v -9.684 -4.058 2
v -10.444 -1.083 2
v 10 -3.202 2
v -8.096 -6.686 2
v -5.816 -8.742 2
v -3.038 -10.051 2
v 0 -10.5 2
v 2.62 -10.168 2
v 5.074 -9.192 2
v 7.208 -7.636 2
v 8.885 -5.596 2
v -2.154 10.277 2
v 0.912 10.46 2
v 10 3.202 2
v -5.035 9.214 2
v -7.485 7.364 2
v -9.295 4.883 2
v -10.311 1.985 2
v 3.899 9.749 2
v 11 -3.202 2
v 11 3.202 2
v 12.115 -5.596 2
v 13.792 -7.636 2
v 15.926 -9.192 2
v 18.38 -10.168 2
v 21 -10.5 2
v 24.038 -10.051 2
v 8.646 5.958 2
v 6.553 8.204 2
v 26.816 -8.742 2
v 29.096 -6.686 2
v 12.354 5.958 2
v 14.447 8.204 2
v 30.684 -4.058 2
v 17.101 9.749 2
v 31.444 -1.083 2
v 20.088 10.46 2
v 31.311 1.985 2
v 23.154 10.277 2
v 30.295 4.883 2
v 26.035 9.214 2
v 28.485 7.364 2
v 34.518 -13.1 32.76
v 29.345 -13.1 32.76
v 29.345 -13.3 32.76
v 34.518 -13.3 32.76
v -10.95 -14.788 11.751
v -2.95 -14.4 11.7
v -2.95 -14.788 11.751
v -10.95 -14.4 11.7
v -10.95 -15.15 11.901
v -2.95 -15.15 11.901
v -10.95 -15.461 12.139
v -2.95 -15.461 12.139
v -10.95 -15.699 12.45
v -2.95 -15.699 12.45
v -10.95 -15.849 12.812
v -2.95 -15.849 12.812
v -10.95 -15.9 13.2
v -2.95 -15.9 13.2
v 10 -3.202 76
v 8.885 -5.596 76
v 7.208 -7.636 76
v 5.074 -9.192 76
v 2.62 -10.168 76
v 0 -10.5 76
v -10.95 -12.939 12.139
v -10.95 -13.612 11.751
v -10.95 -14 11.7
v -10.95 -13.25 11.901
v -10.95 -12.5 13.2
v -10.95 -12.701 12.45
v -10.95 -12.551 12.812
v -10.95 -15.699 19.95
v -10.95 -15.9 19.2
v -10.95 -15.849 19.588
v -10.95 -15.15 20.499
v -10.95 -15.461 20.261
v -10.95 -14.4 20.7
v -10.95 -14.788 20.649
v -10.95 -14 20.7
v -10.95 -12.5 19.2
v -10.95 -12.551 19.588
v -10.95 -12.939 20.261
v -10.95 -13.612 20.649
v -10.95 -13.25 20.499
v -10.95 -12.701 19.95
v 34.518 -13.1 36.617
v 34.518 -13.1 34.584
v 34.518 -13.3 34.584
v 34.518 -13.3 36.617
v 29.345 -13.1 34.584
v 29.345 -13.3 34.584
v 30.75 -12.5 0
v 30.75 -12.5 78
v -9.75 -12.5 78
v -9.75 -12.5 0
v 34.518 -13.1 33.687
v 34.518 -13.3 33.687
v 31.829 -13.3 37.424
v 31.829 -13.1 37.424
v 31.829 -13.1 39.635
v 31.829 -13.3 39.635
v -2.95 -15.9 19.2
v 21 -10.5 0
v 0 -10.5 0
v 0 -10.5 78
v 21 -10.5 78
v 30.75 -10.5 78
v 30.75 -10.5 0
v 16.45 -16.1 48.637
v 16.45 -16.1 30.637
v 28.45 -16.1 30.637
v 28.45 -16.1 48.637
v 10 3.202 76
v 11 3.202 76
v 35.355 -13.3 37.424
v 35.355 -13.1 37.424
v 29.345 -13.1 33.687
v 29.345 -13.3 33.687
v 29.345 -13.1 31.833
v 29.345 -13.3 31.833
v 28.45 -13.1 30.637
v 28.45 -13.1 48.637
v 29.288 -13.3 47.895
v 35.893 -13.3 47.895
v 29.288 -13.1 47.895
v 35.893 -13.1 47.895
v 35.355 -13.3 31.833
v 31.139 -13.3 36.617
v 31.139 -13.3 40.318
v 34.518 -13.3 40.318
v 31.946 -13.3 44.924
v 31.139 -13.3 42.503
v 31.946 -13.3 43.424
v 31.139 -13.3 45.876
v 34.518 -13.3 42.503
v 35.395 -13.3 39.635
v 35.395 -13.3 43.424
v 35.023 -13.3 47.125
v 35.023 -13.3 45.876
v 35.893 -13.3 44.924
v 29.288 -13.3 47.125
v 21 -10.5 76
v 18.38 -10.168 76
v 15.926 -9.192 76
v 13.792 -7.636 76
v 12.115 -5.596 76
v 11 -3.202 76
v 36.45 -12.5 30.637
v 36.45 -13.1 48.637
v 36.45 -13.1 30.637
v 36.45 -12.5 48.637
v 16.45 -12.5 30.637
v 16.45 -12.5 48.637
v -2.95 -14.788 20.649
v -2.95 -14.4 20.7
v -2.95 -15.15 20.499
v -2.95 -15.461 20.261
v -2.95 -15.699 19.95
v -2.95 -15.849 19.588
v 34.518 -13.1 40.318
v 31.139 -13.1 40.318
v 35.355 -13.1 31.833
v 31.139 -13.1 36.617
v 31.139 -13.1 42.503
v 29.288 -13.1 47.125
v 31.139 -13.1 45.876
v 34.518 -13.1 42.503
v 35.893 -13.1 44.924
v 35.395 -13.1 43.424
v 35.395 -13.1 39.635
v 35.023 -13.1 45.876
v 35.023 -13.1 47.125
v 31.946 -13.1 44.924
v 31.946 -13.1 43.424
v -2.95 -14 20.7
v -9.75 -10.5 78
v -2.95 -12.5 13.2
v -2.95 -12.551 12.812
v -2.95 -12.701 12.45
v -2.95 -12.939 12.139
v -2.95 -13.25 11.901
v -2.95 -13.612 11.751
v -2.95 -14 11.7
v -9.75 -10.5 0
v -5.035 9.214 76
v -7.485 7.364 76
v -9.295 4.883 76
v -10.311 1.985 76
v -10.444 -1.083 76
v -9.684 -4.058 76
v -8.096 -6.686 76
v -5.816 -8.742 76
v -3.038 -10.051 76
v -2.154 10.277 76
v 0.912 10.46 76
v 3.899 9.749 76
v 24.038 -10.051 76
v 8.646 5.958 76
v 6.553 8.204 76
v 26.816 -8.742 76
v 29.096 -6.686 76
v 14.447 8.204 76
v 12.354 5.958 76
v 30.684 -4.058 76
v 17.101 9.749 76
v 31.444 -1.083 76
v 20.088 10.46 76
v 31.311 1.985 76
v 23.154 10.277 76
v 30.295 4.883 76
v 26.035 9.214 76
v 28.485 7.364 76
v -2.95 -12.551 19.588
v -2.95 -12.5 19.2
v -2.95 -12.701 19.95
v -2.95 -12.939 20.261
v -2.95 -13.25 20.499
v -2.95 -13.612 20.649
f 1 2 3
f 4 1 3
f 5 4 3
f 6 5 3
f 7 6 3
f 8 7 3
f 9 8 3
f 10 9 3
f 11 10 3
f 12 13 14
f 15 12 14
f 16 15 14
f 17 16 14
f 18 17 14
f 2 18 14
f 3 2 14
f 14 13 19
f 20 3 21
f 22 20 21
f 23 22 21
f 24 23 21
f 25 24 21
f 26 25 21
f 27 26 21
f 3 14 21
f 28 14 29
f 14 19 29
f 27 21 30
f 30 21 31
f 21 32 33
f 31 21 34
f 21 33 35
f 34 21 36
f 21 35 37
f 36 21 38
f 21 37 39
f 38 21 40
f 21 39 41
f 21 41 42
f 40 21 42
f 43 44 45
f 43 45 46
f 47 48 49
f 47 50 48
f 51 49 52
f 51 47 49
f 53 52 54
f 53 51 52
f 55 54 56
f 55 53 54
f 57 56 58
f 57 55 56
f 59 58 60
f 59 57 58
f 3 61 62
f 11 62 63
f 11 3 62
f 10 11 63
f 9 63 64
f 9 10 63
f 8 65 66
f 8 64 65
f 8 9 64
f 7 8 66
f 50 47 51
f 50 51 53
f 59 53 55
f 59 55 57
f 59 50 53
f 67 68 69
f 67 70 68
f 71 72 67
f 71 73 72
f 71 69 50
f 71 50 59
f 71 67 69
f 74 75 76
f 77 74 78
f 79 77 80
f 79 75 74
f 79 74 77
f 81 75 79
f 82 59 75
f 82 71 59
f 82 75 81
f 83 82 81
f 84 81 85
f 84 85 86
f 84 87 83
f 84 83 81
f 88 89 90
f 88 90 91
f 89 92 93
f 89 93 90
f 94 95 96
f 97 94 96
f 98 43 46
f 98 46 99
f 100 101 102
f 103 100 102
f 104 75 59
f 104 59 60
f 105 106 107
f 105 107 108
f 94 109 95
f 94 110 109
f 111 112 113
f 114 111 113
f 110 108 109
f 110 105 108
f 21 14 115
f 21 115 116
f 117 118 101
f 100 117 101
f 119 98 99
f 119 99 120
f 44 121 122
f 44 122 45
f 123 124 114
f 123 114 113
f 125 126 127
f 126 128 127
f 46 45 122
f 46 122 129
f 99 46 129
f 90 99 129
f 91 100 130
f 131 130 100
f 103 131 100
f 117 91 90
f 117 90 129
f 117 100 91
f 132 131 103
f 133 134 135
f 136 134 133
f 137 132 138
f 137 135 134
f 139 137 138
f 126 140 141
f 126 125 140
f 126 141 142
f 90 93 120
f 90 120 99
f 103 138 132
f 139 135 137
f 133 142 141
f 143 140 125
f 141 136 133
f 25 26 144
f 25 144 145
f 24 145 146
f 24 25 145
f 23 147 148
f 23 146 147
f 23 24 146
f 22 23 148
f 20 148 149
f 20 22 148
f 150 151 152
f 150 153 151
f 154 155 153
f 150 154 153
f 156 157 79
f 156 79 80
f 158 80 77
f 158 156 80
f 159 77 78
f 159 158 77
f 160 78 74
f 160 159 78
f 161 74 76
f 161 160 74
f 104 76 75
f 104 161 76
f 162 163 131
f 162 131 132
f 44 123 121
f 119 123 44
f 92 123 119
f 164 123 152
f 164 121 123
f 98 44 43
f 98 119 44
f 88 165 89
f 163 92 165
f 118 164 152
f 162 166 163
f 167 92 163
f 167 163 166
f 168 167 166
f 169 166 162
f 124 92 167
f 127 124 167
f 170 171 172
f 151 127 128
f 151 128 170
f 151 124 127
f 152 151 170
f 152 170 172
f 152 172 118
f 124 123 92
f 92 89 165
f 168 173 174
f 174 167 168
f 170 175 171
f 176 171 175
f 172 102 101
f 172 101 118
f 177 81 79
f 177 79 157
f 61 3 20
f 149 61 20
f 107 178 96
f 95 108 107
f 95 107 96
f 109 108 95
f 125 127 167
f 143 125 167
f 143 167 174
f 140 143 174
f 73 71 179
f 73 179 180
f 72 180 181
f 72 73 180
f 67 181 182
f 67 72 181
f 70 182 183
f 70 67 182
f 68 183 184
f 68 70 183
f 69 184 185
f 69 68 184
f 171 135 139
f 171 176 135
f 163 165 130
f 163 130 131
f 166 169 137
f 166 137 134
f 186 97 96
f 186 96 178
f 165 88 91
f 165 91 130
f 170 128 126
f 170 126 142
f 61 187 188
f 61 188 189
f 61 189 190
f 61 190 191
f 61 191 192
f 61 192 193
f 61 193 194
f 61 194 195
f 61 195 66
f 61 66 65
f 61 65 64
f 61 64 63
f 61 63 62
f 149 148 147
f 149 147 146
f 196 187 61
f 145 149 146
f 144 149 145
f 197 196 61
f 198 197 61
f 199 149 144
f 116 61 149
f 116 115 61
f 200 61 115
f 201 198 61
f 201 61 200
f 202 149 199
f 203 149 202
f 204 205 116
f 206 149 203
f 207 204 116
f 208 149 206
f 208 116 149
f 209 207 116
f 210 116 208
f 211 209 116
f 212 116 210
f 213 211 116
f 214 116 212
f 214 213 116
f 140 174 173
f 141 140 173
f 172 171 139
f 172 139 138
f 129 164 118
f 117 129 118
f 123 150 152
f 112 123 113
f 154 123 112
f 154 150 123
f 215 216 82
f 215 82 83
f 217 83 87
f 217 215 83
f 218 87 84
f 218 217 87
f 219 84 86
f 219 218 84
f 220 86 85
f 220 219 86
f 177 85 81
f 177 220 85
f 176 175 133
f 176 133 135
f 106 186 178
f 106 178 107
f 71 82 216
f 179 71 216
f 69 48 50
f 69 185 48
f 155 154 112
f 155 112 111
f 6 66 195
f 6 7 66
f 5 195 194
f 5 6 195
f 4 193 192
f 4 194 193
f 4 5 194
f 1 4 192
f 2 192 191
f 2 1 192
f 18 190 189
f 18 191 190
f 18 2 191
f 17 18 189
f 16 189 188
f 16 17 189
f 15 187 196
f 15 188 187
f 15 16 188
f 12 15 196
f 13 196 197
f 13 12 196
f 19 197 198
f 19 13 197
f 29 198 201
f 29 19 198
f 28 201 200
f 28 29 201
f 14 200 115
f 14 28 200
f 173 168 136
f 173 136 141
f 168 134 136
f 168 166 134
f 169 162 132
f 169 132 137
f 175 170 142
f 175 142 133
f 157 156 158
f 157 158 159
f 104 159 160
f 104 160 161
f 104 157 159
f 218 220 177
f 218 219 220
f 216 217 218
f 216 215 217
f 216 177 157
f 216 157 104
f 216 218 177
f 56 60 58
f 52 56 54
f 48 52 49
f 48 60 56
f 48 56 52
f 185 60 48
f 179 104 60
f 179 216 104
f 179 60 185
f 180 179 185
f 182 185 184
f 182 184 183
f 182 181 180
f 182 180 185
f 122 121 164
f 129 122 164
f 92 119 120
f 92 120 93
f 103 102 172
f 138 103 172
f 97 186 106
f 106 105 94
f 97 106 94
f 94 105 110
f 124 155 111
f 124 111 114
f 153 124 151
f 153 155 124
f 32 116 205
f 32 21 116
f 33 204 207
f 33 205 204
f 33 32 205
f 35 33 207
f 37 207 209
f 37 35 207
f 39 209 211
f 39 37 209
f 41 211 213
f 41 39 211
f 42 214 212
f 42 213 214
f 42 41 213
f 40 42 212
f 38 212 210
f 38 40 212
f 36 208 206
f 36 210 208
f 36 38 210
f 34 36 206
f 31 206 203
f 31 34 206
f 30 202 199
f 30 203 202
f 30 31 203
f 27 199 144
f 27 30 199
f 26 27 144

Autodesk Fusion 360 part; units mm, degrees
sketch "Sketch1" plane through (0, 0, 0) normal (0, 0, 1) x (1, 0, 0)
  line L0 (-9.75, -10.5) -> (30.75, -10.5)
  line L1 (30.75, -10.5) -> (30.75, -12.5)
  line L2 (30.75, -12.5) -> (-9.75, -12.5)
  line L3 (-9.75, -12.5) -> (-9.75, -10.5)
  line L4 (21, 0) -> (0, 0) construction
  line L5 (10.5, -10.5) -> (10.5, 0) construction
  line L6 (10, 3.2016) -> (11, 3.2016)
  line L7 (10, -3.2016) -> (11, -3.2016)
  arc A0 (10, 3.2016) -> (10, -3.2016) centre (0, 0) ccw
  arc A1 (10, -3.2016) -> (10.5, 0) centre (0, 0) ccw construction
  arc A2 (11, -3.2016) -> (11, 3.2016) centre (21, 0) ccw
  arc A3 (10.5, 0) -> (11, -3.2016) centre (21, 0) ccw construction
  arc A4 (10.5, 0) -> (10, 3.2016) centre (0, 0) ccw construction
  arc A5 (11, 3.2016) -> (10.5, 0) centre (21, 0) ccw construction
  dimension "d1" = 21
  dimension "d2" = 2
  dimension "d3" = 40.5
  dimension "d9" = 1
extrude "Extrude1" add sketch "Sketch1" along normal blind 78 contours L0 L1 L2 L3 makes body 1
extrude "Extrude2" add sketch "Sketch1" along normal blind 74 from surface at 2 separate body contours L6 L7 A0 A2 makes body 2
sketch "Sketch4" plane through (0, -12.5, 0) normal (0, -1, 0) x (1, 0, 0)
  line L0 (-9.75, 0) -> (30.75, 0)
  line L1 (30.75, 0) -> (30.75, 78) construction
  line L2 (30.75, 78) -> (-9.75, 78)
  line L3 (-9.75, 78) -> (-9.75, 0) construction
  line L4 (-10.95, 20.7) -> (-2.95, 20.7)
  line L5 (-2.95, 20.7) -> (-2.95, 11.7)
  line L6 (-2.95, 11.7) -> (-10.95, 11.7)
  line L7 (-10.95, 11.7) -> (-10.95, 20.7)
  line L8 (16.45, 48.6368) -> (36.45, 48.6368)
  line L9 (36.45, 48.6368) -> (36.45, 30.6368)
  line L10 (36.45, 30.6368) -> (16.45, 30.6368)
  line L11 (16.45, 30.6368) -> (16.45, 48.6368)
  line L12 (28.45, 48.6368) -> (28.45, 30.6368)
  dimension "d25" = 9
  dimension "d26" = 8
  dimension "d27" = 1.2
  dimension "d28" = 11.7
  dimension "d29" = 18
  dimension "d30" = 20
  dimension "d31" = 12
  dimension "d32" = 5.7
extrude "Extrude5" add sketch "Sketch4" along normal blind 3.4 separate body contours L4 L5 L6 L7 makes body 3
extrude "Extrude6" add sketch "Sketch4" along normal blind 0.6 separate body contours L8 L9 L10 L12 makes body 4
extrude "Extrude7" add sketch "Sketch4" along normal blind 3.6 contours L8 L10 L11 L12 bodies 4
fillet "Fillet1" radius 1.5 4 edges at (-6.95, -15.9, 11.7) (-6.95, -12.5, 11.7) (-6.95, -15.9, 20.7) (-6.95, -12.5, 20.7) on bodies 3
sketch "Sketch5" plane through (0, -13.1, 0) normal (0, -1, 0) x (1, 0, 0)
  line L0 (36.45, 48.6368) -> (28.45, 48.6368)
  line L1 (28.45, 48.6368) -> (28.45, 30.6368)
  line L2 (28.45, 30.6368) -> (36.45, 30.6368)
  line L3 (36.45, 30.6368) -> (36.45, 48.6368)
  line L4 (29.3453, 31.8332) -> (35.355, 31.8332)
  line L5 (35.355, 31.8332) -> (35.355, 37.4243)
  line L6 (35.355, 37.4243) -> (31.8287, 37.4243)
  line L7 (31.8287, 37.4243) -> (31.8287, 39.6348)
  line L8 (31.8287, 39.6348) -> (35.3949, 39.6348)
  line L9 (29.3453, 31.8332) -> (29.3453, 32.7601)
  line L10 (29.3453, 32.7601) -> (34.5178, 32.7601)
  line L11 (34.5178, 32.7601) -> (34.5178, 33.6869)
  line L12 (34.5178, 33.6869) -> (29.3453, 33.6869)
  line L13 (29.3453, 33.6869) -> (29.3453, 34.5839)
  line L14 (29.3453, 34.5839) -> (34.5178, 34.5839)
  line L15 (34.5178, 34.5839) -> (34.5178, 36.617)
  line L16 (34.5178, 36.617) -> (31.1393, 36.617)
  line L17 (31.1393, 36.617) -> (31.1393, 40.3179)
  line L18 (31.1393, 40.3179) -> (34.5178, 40.3179)
  line L19 (34.5178, 40.3179) -> (34.5178, 42.5026)
  line L20 (34.5178, 42.5026) -> (31.1393, 42.5026)
  line L21 (31.1393, 42.5026) -> (31.1393, 45.8761)
  line L22 (31.1393, 45.8761) -> (35.8932, 45.8761)
  line L23 (35.8932, 45.8761) -> (35.8932, 44.9244)
  line L24 (35.8932, 44.9244) -> (31.9465, 44.9244)
  line L25 (31.9465, 44.9244) -> (31.9465, 43.4239)
  line L26 (31.9465, 43.4239) -> (35.3949, 43.4239)
  line L27 (35.3949, 43.4239) -> (35.3949, 39.6348)
  line L28 (29.2875, 47.8951) -> (29.2875, 47.1254)
  line L29 (29.2875, 47.1254) -> (35.0233, 47.1254)
  line L30 (35.0233, 47.1254) -> (35.0233, 45.8761)
  line L31 (35.8932, 45.8761) -> (35.8932, 47.8951)
  line L32 (35.8932, 47.8951) -> (29.2875, 47.8951)
extrude "Extrude8" add sketch "Sketch5" along normal blind 0.2 contours L4 L5 L6 L7 L8 L9 L10 L11 L12 L13 L14 L15 L16 L17 L18 L19 L20 L21 L22 L23 L24 L25 L26 L27 | L22 L28 L29 L30 L31 L32 bodies 4
